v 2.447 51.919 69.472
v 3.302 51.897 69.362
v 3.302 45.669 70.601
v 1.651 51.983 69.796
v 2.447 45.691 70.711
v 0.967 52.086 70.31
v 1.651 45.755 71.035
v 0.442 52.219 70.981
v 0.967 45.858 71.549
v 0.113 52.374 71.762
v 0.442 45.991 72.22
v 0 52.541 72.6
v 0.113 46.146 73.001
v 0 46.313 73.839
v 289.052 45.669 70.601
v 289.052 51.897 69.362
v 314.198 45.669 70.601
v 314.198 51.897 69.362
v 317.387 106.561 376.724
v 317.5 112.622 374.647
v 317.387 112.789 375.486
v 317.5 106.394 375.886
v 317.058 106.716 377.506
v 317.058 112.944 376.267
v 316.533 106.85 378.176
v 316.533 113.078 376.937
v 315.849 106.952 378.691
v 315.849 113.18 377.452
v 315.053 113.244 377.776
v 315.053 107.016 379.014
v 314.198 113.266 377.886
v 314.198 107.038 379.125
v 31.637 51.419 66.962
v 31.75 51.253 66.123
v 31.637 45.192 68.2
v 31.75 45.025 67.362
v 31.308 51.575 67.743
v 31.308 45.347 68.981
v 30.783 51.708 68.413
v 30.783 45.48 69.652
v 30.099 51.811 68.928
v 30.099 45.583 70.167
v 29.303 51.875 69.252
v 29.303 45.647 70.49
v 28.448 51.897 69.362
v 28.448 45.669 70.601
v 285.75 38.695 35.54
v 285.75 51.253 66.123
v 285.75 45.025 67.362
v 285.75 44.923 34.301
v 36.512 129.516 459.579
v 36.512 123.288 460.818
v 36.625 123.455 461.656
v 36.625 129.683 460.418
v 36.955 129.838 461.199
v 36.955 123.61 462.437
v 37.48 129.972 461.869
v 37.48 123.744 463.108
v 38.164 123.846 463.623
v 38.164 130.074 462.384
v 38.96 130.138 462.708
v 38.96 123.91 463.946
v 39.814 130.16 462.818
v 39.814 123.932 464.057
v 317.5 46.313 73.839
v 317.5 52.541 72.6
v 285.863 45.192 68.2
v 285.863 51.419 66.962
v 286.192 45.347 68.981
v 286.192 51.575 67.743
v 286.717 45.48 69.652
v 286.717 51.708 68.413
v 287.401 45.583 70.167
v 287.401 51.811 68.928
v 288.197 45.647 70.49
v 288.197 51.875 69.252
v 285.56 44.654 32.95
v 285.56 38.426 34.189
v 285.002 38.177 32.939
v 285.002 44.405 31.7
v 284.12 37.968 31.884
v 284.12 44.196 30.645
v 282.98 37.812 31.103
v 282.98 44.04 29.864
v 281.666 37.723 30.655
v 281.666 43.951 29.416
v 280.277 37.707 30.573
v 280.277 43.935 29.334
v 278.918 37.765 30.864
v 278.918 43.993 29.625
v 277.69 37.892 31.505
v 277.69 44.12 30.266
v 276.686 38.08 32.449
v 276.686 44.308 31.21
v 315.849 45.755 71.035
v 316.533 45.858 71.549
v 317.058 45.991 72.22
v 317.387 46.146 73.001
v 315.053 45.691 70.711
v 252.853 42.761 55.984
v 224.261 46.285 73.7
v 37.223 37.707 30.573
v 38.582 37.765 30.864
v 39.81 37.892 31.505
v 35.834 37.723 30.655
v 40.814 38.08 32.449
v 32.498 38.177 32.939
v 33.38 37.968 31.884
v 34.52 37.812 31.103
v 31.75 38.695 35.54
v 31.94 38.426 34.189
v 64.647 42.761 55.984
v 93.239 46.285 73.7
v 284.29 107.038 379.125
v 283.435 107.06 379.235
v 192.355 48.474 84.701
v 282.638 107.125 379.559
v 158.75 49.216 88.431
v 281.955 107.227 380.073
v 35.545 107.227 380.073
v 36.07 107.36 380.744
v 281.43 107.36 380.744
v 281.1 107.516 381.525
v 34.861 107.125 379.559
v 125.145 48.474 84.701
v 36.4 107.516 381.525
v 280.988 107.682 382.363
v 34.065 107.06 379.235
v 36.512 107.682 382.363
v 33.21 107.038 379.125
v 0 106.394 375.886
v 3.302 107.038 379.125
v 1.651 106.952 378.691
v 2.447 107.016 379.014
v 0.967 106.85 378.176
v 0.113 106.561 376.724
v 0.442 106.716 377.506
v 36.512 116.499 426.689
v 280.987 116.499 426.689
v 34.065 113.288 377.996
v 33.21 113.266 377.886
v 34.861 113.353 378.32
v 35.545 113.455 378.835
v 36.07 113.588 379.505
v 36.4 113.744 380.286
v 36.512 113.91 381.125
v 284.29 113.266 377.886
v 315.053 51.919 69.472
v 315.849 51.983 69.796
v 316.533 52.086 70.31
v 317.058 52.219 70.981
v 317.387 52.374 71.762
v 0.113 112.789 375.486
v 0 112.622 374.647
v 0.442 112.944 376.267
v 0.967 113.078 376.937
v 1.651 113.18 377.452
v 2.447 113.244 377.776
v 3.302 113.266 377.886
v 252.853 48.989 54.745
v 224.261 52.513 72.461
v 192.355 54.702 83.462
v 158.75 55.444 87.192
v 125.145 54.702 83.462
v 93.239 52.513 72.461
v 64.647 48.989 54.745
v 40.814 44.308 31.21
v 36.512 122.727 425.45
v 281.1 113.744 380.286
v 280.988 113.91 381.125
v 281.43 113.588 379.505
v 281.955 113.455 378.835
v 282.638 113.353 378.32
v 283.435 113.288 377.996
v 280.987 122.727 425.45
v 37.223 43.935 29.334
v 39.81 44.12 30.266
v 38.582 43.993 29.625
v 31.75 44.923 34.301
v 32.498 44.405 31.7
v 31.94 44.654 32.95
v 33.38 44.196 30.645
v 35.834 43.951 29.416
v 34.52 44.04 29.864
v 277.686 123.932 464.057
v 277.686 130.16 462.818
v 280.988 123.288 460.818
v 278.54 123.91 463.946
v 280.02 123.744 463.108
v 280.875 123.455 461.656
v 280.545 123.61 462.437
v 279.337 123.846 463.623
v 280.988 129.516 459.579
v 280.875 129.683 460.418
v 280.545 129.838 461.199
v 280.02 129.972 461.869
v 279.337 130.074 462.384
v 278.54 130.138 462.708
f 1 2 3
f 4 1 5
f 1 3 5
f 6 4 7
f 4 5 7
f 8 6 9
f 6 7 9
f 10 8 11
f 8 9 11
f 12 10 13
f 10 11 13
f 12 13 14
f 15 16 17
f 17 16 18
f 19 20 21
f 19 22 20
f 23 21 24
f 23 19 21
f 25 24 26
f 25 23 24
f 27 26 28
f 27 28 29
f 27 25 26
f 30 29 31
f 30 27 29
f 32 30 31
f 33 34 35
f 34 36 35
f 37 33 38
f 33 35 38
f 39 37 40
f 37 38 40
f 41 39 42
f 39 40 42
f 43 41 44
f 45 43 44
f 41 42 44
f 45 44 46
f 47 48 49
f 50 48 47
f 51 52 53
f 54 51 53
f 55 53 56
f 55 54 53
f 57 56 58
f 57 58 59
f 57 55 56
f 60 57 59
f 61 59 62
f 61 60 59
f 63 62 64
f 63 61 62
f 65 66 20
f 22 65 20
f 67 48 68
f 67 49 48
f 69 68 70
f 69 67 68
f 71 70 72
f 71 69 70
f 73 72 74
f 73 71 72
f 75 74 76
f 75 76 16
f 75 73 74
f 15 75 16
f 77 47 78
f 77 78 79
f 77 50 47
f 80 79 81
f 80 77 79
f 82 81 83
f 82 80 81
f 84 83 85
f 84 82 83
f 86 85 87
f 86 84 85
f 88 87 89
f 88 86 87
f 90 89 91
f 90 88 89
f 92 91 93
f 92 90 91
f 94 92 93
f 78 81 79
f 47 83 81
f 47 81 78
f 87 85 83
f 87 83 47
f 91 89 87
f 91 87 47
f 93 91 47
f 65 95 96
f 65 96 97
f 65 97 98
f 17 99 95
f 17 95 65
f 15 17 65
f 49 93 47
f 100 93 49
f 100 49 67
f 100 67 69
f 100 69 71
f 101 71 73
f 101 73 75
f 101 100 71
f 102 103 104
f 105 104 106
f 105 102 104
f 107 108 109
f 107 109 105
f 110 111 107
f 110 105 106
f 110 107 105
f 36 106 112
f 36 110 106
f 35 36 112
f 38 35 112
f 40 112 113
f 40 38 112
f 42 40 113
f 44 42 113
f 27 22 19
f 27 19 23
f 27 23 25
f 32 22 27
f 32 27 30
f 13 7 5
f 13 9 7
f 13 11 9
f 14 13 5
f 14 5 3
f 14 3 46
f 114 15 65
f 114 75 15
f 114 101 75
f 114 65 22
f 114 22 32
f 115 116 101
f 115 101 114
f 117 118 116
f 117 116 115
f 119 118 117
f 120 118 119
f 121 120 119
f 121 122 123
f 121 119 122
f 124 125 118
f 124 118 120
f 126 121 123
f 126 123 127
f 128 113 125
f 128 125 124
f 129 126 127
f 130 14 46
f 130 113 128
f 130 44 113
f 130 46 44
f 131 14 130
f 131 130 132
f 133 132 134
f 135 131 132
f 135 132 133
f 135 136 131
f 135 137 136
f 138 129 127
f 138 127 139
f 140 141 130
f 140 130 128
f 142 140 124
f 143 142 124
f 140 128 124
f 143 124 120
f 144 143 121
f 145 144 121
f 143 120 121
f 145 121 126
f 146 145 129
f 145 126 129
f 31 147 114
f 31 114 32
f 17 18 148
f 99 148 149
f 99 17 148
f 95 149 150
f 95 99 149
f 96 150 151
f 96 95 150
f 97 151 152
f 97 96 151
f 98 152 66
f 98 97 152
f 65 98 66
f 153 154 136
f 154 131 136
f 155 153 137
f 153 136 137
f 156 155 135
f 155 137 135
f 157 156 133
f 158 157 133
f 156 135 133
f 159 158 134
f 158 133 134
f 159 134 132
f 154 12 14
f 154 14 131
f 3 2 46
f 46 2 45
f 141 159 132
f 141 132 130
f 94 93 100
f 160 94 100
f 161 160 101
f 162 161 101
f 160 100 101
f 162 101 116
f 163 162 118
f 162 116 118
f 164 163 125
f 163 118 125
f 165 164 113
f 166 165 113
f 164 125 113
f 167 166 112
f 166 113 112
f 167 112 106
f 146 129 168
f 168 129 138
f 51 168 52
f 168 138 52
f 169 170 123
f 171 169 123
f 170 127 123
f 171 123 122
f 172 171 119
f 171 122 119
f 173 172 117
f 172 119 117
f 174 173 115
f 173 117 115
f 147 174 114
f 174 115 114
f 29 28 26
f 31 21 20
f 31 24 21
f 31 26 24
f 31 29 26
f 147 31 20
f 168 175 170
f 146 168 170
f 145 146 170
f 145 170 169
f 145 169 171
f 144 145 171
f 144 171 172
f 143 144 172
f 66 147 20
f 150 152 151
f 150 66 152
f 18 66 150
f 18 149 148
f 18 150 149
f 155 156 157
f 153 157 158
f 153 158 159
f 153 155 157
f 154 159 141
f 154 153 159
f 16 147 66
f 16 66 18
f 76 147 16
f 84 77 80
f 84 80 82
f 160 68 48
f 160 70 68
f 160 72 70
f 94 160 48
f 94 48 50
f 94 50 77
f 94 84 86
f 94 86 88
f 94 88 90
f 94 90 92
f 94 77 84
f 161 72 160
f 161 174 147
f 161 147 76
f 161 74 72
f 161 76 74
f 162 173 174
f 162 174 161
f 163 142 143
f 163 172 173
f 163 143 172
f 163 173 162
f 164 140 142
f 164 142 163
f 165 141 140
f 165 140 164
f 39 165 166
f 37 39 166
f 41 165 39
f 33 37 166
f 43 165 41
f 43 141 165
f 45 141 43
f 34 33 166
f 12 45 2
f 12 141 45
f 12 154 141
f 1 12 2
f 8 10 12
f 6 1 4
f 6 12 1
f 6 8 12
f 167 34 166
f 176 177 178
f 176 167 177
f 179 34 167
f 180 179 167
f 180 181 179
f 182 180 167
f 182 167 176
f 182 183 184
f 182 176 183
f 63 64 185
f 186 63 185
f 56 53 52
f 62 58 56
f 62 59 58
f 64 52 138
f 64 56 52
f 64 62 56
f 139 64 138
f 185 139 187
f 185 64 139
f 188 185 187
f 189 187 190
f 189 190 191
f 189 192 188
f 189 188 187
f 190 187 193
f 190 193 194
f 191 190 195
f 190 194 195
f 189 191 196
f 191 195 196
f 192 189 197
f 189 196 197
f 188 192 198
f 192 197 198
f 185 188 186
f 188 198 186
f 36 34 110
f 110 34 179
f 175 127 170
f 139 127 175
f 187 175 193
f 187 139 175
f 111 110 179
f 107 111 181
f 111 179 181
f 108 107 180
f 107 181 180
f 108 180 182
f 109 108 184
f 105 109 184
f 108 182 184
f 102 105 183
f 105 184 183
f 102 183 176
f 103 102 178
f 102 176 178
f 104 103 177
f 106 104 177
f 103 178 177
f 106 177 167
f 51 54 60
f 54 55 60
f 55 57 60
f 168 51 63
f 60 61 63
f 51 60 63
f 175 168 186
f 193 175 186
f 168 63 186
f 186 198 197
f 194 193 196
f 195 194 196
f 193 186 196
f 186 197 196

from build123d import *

# Parameters (mm, degrees)
BOSS_EXTRUDE1_DEPTH = 317.5
SKETCH2_W           = 31.75
SKETCH2_H           = 70.720826982
SKETCH2_W_2         = 36.5125
SKETCH2_H_2         = 48.495826983
CUT_EXTRUDE1_DEPTH  = 90.351177502
SKETCH5_W           = 244.475
SKETCH5_H           = 38.1
BOSS_EXTRUDE2_DEPTH = 6.35
CUT_EXTRUDE3_DEPTH  = 97.641296888
FILLET3_R           = 5.08
FILLET4_R           = 3.302


with BuildPart() as part:
    # Sketch1 → Boss-Extrude1 (new body)
    with BuildSketch(Plane(origin=(0, 0, 0), x_dir=(0, 0, -1), z_dir=(1, 0, 0))):
        Polygon((0, 38.1), (-1.238823545, 31.872013469), (-426.688823545, 116.499280171), (-425.45, 122.727266702), align=None)
    extrude(amount=BOSS_EXTRUDE1_DEPTH)

    # Sketch2 → Cut-Extrude1 (cut, through all)
    with BuildSketch(Plane(origin=(0, 36.649905094, -7.290119387), x_dir=(1, 0, 0), z_dir=(0, 0.98078528, -0.195090322))):
        with Locations((15.875, -42.79335476)):
            Rectangle(SKETCH2_W, SKETCH2_H)
        with Locations((18.25625, -416.970086038)):
            Rectangle(SKETCH2_W_2, SKETCH2_H_2)
        with Locations((301.625, -42.79335476)):
            Rectangle(SKETCH2_W, SKETCH2_H)
        with Locations((299.24375, -416.970086038)):
            Rectangle(SKETCH2_W_2, SKETCH2_H_2)
    extrude(amount=-CUT_EXTRUDE1_DEPTH, mode=Mode.SUBTRACT)

    # Sketch5 → Boss-Extrude2 (add)
    with BuildSketch(Plane(origin=(0, 30.421918564, -6.051295842), x_dir=(1, 0, 0), z_dir=(0, -0.98078528, 0.195090322))):
        with Locations((158.75, 460.267999529)):
            Rectangle(SKETCH5_W, SKETCH5_H)
    extrude(amount=-BOSS_EXTRUDE2_DEPTH)

    # Sketch6 → Cut-Extrude3 (cut, through all)
    with BuildSketch(Plane(origin=(0, 30.421918564, -6.051295842), x_dir=(1, 0, 0), z_dir=(0, -0.98078528, 0.195090322))):
        with BuildLine():
            Line((31.75, 26.482941269), (31.75, 7.432941269))
            Line((31.75, 7.432941269), (285.75, 7.432941269))
            Line((285.75, 7.432941269), (285.75, 26.482941269))
            ThreePointArc((285.75, 26.482941269), (158.75, 96.332941269), (31.75, 26.482941269))
        make_face()
    extrude(amount=-CUT_EXTRUDE3_DEPTH, mode=Mode.SUBTRACT)

    # Fillet3
    fillet3_edges = [part.edges().sort_by_distance(p)[0] for p in [
        (285.75, 38.702477369, 19.303371364),
        (31.75, 38.702477369, 19.303371364),
    ]]
    fillet(fillet3_edges, radius=FILLET3_R)

    # Fillet4
    fillet4_edges = [part.edges().sort_by_distance(p)[0] for p in [
        (0, 48.782955644, 69.981357895),
        (0, 110.152206934, 378.505418507),
        (317.5, 110.152206934, 378.505418507),
        (317.5, 48.782955644, 69.981357895),
        (36.5125, 110.152206934, 378.505418507),
        (285.75, 48.782955644, 69.981357895),
        (280.9875, 110.152206934, 378.505418507),
        (31.75, 48.782955644, 69.981357895),
        (36.5125, 127.046214705, 463.437330956),
        (280.9875, 127.046214705, 463.437330956),
    ]]
    fillet(fillet4_edges, radius=FILLET4_R)


solid = part.part
